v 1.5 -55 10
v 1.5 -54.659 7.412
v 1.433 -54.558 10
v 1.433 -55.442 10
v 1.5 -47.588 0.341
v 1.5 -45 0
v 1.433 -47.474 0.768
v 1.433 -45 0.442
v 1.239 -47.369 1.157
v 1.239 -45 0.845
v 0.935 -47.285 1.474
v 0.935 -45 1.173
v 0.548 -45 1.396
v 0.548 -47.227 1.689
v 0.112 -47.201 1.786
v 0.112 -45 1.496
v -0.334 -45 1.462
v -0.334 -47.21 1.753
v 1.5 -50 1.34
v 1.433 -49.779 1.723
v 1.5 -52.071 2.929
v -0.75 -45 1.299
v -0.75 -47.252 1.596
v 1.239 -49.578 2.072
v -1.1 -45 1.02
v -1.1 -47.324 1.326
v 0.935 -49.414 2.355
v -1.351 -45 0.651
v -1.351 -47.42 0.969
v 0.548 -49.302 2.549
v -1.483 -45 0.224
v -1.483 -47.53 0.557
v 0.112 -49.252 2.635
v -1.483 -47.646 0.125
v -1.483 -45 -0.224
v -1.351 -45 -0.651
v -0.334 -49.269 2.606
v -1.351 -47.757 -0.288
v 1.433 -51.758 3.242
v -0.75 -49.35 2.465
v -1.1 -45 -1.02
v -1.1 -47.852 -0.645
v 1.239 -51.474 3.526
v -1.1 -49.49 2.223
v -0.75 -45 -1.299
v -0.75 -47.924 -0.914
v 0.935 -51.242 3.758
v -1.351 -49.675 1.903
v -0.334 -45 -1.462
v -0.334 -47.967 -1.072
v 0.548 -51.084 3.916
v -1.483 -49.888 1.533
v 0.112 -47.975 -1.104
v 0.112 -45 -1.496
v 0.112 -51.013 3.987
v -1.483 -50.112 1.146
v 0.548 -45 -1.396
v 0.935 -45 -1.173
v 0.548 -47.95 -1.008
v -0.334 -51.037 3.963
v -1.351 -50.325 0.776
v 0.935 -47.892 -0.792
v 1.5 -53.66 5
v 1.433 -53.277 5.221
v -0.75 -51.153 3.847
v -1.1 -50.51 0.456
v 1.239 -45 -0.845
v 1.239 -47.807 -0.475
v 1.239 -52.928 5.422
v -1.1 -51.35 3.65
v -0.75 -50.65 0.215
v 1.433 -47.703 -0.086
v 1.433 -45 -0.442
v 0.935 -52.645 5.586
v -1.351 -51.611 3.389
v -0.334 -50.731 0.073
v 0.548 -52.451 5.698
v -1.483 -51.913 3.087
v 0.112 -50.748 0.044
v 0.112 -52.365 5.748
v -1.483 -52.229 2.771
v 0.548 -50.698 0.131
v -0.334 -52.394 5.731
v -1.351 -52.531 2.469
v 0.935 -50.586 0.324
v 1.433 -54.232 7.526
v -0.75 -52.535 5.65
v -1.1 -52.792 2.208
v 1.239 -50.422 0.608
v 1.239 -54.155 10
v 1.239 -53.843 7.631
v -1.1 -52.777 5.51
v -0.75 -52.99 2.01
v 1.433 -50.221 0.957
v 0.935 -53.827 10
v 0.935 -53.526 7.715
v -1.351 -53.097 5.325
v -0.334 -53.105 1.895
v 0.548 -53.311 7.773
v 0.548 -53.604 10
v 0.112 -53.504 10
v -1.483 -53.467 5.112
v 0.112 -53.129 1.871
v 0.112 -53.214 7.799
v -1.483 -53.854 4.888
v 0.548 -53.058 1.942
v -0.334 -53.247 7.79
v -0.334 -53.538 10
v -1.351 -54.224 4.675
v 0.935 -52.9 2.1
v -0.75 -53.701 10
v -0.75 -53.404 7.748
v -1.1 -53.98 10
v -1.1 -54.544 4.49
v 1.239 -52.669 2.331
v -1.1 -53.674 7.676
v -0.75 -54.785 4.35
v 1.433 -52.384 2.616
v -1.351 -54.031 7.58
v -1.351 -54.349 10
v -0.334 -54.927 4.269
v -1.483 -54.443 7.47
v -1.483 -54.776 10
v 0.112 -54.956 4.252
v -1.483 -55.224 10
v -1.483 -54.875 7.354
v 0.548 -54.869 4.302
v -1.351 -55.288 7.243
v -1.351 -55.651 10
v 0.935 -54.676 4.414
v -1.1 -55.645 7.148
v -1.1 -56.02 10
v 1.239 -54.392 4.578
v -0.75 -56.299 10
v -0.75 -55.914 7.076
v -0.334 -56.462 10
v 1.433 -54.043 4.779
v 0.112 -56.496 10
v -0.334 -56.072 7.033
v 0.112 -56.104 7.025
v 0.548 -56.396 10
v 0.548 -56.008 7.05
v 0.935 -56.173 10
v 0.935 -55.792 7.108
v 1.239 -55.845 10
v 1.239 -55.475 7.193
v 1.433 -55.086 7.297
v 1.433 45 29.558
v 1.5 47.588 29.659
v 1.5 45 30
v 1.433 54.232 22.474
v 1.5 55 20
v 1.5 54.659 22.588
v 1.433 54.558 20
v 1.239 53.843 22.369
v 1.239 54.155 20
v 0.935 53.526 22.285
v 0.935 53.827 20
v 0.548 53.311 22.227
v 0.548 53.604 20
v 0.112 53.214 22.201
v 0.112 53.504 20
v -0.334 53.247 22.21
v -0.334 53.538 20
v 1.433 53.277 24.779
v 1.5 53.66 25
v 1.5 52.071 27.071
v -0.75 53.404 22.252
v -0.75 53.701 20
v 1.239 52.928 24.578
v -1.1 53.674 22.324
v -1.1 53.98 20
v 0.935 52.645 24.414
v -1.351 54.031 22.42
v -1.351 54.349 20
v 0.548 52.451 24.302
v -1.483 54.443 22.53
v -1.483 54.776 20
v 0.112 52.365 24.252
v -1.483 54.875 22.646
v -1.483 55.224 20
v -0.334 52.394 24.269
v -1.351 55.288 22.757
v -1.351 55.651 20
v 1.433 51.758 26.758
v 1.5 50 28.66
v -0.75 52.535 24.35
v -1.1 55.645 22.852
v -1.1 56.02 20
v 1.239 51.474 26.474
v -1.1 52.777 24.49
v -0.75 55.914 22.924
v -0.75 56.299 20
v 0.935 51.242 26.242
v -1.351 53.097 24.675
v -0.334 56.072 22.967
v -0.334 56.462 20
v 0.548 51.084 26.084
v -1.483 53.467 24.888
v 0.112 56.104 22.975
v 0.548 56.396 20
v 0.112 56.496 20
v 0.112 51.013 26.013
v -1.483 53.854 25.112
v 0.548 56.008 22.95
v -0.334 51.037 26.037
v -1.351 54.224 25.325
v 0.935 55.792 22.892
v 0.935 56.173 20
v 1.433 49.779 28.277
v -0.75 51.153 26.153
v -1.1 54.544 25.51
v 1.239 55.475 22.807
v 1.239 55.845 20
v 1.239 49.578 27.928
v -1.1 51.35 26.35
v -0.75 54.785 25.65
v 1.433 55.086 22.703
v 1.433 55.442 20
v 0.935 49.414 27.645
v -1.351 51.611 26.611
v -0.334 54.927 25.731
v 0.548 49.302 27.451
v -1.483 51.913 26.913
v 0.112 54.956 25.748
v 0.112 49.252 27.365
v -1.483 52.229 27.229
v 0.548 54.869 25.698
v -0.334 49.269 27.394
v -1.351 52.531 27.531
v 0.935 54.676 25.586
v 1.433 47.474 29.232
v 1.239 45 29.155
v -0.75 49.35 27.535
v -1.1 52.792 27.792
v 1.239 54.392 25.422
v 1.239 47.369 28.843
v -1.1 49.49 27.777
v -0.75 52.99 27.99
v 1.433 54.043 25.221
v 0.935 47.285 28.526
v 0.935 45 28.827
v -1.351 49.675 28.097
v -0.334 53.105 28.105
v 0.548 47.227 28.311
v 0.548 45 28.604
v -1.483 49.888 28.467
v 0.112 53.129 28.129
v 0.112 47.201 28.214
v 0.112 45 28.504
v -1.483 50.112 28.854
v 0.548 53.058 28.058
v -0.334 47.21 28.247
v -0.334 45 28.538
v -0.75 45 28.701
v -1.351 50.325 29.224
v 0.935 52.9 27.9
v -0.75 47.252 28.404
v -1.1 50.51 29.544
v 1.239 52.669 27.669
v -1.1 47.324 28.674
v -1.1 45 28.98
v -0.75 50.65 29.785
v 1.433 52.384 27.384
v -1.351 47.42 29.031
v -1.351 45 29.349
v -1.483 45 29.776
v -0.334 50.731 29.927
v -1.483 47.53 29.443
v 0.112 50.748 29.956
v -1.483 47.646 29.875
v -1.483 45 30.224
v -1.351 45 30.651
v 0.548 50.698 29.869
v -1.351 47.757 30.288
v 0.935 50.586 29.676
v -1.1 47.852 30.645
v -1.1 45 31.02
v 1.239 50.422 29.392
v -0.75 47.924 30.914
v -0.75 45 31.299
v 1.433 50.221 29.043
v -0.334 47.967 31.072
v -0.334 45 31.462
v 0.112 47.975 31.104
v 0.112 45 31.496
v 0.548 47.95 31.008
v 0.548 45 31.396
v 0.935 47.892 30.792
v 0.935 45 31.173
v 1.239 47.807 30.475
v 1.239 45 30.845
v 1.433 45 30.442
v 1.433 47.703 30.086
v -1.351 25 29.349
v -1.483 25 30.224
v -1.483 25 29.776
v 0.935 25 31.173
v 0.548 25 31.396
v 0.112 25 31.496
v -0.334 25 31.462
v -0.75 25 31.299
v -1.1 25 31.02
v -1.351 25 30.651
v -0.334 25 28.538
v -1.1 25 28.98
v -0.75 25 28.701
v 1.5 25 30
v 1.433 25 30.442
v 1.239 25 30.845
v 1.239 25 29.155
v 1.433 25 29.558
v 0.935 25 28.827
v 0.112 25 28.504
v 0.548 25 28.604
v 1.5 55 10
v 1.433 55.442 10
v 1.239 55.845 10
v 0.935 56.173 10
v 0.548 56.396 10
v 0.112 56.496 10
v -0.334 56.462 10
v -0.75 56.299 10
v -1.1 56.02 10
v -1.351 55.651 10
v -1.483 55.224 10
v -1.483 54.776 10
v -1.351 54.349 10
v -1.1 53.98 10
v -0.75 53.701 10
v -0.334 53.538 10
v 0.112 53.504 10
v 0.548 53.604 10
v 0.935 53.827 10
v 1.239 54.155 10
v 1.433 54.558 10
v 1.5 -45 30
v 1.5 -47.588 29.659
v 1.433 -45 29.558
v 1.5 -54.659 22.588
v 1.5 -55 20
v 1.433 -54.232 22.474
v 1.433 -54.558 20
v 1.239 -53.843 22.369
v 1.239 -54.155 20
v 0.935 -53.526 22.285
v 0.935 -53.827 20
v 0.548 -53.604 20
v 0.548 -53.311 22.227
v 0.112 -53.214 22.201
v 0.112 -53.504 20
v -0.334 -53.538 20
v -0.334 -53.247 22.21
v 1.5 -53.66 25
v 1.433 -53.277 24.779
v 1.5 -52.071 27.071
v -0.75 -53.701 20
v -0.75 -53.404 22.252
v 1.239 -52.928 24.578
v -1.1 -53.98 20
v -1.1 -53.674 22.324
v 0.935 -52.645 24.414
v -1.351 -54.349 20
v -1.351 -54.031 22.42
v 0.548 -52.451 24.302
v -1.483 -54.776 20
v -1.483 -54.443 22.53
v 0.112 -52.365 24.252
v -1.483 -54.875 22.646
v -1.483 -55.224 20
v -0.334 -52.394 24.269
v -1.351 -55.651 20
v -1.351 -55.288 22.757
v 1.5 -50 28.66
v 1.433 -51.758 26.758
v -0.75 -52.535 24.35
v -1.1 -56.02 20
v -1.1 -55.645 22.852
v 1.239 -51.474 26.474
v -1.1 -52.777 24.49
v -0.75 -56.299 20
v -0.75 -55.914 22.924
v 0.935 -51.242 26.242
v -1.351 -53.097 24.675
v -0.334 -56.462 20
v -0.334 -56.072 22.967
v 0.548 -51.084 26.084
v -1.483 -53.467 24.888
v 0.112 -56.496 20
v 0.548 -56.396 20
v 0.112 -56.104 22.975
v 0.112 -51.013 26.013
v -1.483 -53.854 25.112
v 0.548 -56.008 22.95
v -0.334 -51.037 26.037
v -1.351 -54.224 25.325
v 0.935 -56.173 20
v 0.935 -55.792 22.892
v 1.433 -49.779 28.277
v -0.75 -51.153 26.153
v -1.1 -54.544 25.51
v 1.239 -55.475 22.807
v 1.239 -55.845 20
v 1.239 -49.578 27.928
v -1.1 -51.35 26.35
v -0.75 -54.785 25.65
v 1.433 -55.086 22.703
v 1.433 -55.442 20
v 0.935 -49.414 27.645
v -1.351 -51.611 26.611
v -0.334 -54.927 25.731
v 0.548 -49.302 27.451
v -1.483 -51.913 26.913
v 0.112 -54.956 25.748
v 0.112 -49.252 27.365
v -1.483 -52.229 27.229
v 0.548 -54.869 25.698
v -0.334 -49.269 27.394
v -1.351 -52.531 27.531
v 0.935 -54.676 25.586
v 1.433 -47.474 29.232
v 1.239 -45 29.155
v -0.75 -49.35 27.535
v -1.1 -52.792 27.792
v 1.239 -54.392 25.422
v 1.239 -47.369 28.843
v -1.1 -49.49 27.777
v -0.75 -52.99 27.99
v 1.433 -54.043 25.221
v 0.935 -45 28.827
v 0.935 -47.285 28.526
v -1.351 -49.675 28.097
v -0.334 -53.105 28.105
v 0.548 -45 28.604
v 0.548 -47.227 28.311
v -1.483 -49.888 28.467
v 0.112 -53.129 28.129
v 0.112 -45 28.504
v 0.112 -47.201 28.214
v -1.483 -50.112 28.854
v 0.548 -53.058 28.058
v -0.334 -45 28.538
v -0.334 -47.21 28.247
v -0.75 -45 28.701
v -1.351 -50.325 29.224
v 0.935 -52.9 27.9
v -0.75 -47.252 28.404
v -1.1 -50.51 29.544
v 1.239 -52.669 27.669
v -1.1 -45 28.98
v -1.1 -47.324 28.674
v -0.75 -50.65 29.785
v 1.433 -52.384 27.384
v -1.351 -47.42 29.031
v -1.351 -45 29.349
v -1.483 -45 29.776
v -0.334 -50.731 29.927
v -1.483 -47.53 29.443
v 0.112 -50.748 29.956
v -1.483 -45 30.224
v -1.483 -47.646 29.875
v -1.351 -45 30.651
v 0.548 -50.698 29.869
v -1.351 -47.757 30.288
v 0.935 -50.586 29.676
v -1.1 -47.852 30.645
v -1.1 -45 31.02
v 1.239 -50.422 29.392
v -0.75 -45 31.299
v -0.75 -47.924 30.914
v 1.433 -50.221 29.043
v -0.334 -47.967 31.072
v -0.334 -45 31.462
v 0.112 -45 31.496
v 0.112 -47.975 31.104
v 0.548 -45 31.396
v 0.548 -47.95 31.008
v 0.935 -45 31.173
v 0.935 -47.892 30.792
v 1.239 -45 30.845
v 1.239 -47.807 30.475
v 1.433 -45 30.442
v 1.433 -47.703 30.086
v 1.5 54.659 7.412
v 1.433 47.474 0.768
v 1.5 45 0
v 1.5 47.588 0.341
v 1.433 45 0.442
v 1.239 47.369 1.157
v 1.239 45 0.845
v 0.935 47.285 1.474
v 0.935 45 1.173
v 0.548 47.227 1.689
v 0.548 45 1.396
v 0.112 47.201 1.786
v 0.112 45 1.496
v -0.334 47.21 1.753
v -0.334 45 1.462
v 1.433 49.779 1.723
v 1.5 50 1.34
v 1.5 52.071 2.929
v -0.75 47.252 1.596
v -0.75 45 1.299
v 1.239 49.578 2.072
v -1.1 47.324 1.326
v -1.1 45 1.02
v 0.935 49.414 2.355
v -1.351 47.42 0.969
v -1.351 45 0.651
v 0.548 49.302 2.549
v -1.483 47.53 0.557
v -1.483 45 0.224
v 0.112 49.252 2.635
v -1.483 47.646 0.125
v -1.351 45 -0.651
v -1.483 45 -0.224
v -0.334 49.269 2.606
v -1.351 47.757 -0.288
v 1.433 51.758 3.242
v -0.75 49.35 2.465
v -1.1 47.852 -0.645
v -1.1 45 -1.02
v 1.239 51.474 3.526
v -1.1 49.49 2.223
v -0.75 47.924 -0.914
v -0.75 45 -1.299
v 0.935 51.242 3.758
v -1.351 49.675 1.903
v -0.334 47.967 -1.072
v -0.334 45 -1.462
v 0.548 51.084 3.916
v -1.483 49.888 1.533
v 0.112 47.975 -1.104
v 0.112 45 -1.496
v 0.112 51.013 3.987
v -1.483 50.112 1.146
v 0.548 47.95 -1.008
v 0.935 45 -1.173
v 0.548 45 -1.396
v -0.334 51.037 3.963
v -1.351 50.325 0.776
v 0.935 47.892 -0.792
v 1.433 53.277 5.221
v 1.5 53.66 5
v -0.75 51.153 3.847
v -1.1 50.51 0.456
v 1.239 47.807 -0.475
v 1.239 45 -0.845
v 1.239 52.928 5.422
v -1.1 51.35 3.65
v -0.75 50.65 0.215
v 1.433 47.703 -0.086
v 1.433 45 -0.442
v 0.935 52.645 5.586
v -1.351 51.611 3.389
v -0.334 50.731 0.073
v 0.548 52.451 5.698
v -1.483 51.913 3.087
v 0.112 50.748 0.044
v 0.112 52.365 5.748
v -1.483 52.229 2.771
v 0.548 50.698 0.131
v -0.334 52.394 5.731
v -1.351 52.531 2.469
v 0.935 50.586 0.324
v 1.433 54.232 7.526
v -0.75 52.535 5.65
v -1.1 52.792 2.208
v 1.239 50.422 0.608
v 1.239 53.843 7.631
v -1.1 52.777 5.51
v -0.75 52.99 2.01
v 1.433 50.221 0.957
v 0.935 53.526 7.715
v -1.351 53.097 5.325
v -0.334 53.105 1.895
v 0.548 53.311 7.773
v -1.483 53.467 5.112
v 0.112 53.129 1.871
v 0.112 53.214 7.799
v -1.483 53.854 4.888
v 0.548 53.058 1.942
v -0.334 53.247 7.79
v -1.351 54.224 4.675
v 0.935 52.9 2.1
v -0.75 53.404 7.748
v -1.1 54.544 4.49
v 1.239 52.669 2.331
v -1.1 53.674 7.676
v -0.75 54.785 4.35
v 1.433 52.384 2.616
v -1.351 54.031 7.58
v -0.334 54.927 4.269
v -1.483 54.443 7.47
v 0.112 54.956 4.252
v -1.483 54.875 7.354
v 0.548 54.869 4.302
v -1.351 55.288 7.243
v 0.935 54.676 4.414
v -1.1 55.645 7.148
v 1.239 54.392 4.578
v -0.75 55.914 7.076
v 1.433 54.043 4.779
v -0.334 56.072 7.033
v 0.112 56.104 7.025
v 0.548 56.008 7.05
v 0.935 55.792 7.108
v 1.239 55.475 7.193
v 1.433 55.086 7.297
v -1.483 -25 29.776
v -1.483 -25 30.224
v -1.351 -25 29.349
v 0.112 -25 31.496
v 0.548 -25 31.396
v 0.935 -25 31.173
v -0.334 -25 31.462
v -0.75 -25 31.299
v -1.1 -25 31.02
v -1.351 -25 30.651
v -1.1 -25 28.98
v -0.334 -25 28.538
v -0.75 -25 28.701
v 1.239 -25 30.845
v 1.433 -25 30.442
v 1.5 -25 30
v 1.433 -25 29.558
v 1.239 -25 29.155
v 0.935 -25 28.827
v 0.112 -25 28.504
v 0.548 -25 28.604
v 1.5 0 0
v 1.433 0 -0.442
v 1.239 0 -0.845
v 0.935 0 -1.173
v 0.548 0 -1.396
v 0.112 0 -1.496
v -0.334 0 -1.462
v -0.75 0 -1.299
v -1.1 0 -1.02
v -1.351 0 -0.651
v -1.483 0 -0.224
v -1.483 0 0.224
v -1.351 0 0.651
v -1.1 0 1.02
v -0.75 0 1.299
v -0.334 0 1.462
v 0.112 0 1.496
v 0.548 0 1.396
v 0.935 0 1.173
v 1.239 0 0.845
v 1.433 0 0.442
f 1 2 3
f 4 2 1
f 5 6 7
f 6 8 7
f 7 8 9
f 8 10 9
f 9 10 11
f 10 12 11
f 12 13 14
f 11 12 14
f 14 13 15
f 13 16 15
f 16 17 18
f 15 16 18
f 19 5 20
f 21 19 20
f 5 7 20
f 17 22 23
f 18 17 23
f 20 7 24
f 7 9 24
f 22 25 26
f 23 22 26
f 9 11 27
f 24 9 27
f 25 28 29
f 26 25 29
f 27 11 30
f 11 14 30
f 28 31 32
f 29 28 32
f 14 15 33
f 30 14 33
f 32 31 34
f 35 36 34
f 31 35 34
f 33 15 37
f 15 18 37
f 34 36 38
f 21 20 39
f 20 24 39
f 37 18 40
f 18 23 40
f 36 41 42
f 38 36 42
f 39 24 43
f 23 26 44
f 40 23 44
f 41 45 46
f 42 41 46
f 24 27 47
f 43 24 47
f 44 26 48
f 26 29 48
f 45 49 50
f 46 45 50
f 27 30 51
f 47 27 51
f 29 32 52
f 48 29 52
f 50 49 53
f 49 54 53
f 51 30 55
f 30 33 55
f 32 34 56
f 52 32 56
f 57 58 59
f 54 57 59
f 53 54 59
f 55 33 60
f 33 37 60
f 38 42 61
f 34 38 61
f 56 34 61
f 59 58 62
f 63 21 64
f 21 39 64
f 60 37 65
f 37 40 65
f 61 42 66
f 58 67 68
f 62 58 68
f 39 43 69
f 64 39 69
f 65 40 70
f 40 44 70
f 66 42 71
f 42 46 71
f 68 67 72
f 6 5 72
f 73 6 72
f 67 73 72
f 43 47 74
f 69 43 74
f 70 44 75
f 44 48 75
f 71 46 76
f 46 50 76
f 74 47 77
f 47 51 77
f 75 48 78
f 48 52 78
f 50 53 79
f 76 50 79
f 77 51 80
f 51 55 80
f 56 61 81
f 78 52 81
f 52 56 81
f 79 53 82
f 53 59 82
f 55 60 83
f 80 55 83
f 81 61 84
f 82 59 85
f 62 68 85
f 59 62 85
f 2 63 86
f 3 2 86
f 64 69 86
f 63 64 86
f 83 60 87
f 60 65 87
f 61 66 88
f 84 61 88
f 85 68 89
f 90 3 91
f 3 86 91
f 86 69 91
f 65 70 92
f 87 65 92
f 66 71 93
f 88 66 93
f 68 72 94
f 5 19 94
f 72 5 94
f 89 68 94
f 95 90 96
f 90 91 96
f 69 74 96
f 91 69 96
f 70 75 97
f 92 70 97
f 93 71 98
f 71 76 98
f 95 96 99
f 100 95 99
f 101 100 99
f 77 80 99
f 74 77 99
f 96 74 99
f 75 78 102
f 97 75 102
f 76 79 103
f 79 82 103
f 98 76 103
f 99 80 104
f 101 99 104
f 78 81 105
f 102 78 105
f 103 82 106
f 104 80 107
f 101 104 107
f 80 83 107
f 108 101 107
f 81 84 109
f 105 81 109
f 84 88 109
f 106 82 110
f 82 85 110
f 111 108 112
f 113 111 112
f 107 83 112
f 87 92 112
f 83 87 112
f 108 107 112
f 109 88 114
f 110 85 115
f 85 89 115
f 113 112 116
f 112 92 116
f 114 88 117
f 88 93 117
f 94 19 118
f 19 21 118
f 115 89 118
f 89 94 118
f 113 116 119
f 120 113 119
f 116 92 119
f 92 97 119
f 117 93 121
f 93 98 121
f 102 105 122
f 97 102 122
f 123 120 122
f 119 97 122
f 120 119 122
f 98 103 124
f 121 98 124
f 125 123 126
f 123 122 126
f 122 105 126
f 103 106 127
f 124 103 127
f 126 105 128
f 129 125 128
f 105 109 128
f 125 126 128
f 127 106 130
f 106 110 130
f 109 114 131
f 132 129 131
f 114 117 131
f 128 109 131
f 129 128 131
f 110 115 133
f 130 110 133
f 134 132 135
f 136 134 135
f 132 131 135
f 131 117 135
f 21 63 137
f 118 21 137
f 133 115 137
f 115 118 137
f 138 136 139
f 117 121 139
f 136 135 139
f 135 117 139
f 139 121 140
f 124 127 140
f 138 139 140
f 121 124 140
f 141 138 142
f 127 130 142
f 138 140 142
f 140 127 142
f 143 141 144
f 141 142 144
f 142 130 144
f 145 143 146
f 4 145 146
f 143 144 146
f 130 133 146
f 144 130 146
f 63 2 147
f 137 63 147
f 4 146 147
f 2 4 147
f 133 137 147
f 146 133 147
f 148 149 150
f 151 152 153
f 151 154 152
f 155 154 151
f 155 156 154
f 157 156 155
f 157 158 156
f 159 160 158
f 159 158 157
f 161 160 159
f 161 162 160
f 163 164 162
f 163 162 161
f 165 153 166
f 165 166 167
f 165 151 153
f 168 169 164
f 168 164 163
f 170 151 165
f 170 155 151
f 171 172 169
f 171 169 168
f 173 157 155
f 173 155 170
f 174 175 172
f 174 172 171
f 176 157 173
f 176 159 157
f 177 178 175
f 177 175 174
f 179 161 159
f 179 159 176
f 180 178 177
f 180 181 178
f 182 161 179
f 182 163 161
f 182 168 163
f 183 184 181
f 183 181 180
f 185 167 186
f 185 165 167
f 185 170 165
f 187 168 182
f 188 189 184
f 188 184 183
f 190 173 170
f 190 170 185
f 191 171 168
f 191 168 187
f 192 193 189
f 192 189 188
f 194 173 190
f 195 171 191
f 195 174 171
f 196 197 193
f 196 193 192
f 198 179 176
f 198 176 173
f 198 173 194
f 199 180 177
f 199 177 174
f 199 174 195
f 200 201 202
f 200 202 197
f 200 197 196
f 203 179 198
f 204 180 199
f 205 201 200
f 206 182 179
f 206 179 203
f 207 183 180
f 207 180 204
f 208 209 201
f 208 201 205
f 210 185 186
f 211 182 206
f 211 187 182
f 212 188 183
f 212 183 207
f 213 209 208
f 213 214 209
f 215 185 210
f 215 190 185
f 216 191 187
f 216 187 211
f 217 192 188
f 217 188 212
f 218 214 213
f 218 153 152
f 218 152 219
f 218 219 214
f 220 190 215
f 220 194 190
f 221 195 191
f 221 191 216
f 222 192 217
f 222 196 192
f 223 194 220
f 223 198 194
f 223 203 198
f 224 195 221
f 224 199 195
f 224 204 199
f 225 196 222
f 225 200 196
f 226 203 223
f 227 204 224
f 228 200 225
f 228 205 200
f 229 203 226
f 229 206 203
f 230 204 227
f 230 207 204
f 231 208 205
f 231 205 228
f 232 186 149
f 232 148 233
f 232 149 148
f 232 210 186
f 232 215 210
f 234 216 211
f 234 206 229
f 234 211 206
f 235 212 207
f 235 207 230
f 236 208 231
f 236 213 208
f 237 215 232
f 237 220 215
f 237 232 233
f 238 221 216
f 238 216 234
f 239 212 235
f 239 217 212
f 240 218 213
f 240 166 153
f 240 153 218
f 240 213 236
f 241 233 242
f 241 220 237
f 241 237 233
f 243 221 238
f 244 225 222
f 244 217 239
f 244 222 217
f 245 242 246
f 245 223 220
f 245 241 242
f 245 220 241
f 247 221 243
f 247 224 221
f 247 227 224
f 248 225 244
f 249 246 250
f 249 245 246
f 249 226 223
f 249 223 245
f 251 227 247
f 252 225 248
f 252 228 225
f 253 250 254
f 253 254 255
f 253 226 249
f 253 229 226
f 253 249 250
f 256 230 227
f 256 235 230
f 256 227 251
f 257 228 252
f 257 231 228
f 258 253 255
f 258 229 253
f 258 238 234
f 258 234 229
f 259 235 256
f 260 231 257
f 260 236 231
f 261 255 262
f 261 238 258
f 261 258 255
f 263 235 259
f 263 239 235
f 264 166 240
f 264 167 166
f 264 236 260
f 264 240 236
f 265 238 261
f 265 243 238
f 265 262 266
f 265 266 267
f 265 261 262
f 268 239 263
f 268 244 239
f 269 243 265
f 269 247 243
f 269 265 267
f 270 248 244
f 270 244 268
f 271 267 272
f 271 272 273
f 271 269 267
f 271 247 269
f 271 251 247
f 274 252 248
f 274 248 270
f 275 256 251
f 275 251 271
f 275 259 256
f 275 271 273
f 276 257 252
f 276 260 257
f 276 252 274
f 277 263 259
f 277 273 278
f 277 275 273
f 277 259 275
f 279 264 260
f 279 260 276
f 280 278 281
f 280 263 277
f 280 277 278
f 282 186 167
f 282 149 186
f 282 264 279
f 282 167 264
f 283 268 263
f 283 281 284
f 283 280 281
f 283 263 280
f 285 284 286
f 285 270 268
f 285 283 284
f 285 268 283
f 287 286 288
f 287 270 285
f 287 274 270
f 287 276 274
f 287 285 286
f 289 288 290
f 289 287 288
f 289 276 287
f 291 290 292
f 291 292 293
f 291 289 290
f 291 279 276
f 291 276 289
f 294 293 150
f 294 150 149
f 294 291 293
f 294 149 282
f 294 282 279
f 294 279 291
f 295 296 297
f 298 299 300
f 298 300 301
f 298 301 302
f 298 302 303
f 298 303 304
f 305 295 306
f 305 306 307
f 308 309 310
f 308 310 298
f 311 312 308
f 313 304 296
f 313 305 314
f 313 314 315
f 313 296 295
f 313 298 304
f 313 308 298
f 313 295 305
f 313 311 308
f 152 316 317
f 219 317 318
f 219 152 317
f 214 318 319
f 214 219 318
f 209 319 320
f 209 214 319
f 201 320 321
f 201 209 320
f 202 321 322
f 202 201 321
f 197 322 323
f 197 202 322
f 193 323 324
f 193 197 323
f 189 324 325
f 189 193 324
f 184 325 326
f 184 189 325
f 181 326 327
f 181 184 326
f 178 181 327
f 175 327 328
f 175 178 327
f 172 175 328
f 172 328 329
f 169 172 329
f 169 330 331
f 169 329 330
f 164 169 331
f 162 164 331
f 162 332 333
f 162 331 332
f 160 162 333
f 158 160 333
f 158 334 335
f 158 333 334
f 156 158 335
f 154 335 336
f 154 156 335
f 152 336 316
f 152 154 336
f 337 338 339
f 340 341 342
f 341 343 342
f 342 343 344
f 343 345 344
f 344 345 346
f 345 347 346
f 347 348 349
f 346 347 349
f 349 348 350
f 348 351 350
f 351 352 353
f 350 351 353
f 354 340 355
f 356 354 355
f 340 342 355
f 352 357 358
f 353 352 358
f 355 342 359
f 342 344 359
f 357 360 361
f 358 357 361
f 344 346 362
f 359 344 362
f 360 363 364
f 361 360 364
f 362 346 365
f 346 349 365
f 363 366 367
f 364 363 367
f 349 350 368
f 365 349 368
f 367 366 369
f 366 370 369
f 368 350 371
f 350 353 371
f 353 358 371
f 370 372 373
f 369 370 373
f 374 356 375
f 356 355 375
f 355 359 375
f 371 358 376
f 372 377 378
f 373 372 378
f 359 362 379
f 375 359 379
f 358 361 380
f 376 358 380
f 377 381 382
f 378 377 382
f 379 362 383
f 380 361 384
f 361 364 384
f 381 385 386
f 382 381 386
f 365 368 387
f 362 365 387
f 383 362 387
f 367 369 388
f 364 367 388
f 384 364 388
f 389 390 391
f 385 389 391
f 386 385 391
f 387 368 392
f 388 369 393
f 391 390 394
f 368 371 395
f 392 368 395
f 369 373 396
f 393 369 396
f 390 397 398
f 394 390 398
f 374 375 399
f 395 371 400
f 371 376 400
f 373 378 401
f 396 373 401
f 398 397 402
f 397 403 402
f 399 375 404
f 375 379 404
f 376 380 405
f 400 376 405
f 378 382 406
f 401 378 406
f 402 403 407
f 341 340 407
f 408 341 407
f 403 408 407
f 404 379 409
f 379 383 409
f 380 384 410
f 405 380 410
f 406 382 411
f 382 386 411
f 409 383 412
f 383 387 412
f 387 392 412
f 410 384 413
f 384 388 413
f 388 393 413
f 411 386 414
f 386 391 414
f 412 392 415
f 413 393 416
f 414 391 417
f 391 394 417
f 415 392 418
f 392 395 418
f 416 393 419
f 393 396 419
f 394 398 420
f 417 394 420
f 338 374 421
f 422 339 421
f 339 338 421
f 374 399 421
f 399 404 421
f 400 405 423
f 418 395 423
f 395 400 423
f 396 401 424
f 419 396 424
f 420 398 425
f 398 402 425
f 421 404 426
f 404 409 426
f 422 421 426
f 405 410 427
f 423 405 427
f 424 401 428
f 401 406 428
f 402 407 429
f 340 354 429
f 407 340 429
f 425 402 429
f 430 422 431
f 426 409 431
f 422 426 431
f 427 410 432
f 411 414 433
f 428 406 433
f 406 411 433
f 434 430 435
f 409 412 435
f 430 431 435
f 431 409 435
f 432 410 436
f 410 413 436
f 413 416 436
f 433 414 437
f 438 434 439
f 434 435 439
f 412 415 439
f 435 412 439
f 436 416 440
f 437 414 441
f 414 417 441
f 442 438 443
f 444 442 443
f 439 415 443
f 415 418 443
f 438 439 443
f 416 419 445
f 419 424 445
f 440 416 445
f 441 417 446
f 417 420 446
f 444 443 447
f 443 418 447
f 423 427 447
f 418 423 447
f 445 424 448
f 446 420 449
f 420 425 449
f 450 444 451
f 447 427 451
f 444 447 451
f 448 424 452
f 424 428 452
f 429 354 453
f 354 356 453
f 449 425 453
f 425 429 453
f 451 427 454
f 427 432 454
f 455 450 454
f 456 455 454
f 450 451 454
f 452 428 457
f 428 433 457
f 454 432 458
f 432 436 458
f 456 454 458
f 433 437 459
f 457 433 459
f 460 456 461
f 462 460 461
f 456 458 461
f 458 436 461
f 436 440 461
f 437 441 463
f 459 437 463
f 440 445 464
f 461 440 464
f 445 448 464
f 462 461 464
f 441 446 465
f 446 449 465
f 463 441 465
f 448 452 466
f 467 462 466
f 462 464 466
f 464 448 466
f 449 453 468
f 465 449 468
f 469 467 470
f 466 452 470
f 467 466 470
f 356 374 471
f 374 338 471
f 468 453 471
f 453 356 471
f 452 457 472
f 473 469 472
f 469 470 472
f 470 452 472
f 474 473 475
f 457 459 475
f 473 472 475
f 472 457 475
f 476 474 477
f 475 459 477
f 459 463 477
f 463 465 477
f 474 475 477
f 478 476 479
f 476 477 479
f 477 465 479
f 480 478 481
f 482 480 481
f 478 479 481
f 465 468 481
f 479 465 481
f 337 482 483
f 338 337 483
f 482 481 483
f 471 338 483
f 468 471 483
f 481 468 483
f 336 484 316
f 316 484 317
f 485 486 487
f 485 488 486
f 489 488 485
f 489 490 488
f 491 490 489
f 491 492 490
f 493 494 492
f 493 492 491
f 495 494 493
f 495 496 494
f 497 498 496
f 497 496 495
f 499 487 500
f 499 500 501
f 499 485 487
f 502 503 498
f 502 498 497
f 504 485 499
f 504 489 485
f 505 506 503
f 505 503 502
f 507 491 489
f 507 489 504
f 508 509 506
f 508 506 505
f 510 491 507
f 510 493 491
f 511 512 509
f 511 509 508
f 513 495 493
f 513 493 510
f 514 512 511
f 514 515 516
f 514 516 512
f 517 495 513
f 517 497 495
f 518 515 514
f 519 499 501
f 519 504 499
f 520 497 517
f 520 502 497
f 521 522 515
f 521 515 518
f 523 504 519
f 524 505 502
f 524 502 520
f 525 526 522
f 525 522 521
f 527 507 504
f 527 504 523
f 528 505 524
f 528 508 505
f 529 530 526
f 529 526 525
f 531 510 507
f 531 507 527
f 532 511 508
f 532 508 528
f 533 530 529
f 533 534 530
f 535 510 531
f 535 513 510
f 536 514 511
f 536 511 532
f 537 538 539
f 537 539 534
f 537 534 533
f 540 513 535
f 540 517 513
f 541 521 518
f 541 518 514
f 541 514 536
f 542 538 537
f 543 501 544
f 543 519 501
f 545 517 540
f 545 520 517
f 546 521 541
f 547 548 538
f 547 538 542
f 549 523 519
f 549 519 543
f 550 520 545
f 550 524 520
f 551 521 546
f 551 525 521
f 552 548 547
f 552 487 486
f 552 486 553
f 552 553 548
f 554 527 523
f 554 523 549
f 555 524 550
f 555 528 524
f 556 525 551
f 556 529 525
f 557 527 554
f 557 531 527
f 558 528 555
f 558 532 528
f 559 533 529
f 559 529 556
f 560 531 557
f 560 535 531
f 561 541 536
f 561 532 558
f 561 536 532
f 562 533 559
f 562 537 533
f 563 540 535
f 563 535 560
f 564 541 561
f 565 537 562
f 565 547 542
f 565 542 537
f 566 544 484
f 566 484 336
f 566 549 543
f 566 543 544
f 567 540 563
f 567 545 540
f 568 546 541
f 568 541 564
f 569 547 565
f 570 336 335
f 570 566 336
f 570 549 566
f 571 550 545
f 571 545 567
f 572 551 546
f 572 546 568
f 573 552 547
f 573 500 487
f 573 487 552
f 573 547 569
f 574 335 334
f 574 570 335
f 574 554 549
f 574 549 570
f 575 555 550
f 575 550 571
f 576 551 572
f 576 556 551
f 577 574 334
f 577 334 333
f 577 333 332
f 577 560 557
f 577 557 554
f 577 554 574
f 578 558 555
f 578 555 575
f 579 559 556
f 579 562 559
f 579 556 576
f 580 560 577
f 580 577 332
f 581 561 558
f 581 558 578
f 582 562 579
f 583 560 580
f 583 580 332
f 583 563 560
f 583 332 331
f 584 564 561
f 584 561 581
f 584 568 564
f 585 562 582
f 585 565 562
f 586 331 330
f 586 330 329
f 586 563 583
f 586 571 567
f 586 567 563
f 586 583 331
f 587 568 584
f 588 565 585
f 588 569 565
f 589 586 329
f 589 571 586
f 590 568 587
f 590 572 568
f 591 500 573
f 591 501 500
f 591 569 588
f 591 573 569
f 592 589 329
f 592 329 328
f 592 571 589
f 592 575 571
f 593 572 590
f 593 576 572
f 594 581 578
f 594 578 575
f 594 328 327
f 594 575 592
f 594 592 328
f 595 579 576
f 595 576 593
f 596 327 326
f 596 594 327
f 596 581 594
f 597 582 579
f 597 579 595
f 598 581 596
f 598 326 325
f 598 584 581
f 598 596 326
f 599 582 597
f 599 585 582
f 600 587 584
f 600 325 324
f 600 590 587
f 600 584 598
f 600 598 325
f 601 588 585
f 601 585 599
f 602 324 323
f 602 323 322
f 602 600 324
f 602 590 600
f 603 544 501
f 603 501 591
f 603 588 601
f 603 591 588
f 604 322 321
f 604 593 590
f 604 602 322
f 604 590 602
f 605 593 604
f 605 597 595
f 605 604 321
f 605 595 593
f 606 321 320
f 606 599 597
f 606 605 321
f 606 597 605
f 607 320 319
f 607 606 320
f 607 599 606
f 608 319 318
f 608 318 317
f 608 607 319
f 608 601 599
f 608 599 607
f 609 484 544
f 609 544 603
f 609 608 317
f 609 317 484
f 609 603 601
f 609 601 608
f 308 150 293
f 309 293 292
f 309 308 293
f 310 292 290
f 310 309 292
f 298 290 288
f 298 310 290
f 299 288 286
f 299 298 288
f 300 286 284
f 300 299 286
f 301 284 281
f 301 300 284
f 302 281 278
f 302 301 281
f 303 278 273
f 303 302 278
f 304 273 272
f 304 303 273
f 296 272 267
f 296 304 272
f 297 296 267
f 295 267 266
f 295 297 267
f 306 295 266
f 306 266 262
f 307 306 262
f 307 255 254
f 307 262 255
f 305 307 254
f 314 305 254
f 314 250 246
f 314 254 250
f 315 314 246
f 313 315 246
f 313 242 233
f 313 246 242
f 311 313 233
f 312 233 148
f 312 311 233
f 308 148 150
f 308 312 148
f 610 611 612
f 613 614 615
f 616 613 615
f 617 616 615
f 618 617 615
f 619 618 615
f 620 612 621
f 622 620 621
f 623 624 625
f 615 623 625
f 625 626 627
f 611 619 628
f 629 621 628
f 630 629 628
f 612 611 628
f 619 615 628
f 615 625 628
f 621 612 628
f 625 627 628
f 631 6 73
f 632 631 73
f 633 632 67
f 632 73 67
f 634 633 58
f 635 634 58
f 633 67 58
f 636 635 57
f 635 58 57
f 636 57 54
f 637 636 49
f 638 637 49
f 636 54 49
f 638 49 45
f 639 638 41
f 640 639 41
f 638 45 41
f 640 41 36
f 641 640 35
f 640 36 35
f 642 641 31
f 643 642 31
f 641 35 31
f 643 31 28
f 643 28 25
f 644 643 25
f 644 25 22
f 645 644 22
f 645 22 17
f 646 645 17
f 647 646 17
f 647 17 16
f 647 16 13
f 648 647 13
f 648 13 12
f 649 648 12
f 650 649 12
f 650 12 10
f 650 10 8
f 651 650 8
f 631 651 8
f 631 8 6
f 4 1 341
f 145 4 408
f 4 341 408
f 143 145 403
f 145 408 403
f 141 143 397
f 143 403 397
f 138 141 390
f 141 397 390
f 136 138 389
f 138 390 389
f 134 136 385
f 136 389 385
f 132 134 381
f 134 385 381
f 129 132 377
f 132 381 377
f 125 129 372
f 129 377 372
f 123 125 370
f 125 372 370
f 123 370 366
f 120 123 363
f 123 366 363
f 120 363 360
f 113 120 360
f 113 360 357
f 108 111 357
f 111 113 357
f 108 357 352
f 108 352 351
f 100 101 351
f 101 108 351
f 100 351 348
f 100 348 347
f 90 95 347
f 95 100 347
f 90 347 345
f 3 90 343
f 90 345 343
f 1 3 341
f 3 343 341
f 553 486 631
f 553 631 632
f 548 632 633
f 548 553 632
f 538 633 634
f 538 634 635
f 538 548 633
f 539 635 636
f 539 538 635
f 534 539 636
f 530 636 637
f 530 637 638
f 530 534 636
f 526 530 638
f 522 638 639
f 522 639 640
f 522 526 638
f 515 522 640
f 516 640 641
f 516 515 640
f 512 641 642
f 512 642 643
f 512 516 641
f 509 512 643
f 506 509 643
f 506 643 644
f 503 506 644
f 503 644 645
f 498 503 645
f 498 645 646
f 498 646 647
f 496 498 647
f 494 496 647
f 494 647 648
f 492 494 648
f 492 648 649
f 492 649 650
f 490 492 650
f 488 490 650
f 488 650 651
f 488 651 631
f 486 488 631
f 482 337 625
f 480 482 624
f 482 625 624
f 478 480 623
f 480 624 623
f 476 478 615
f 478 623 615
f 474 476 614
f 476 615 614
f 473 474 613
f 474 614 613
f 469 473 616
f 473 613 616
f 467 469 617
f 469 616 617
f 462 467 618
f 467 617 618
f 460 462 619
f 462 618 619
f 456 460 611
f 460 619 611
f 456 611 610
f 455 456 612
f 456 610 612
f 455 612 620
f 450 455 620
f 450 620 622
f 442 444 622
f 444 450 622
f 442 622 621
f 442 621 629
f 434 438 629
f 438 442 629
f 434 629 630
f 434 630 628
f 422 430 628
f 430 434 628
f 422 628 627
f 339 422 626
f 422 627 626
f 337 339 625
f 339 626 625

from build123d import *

# Parameters (mm, degrees)
SKETCH_2_R = 1.5


with BuildPart() as part:
    # По траектории1: sweep along a path in Эскиз1
    with BuildLine(Plane(origin=(0, 0, 0), x_dir=(0, 0, -1), z_dir=(1, 0, 0))) as sweep_1_path:
        Line((0, 0), (0, 45))
        ThreePointArc((0, 45), (-2.928932188, 52.071067812), (-10, 55))
        Line((-10, 55), (-20, 55))
        ThreePointArc((-20, 55), (-27.071067812, 52.071067812), (-30, 45))
        Line((-30, 45), (-30, 25))
    # Эскиз2 → По траектории1 (sweep)
    with BuildSketch(Plane(origin=(0, 0, 0), x_dir=(1, 0, 0), z_dir=(0, 1, 0))):
        Circle(SKETCH_2_R)
    sweep(path=sweep_1_path.line)

    # Зеркальное отражение1: part across plane


with BuildPart() as part_1:
    add(part.part)
    add(part.part.mirror(Plane.ZX))


solid = part_1.part
